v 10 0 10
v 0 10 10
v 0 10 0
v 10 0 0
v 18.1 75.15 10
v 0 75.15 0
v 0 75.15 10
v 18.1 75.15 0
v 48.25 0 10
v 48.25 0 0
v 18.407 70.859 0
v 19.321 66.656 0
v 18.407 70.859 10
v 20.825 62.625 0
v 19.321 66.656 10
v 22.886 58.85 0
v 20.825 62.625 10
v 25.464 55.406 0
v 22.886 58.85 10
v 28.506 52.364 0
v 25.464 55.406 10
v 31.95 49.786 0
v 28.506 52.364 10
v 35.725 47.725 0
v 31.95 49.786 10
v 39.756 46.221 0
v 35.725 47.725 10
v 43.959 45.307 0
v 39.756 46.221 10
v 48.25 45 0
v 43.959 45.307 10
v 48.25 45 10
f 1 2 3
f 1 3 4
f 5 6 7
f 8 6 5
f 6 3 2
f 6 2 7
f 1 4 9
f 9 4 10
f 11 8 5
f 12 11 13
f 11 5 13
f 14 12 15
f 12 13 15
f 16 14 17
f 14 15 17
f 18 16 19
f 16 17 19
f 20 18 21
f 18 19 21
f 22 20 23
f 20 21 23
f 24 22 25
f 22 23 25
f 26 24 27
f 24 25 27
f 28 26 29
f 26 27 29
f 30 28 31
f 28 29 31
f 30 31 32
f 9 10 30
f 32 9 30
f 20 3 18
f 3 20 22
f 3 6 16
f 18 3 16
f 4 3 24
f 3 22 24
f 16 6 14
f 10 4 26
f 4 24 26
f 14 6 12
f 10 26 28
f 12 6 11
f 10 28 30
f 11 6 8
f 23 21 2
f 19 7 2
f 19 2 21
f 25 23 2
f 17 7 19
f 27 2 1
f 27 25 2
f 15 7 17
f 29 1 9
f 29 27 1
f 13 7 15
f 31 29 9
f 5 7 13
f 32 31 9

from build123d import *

# Parameters (mm, degrees)
SKETCH_W     = 48.25
SKETCH_H     = 75.15
PAD_DEPTH    = 10
SKETCH001_R  = 30.15
POCKET_DEPTH = 10.001


with BuildPart() as part:
    # Sketch → Pad (new body)
    with BuildSketch(Plane.XY):
        with Locations((24.125, 37.575)):
            Rectangle(SKETCH_W, SKETCH_H)
    extrude(amount=PAD_DEPTH)

    # Sketch001 (on Face6 of Pad) → Pocket (cut, through all)
    with BuildSketch(Plane.XY.offset(10)):
        with Locations((48.25, 75.15)):
            Circle(SKETCH001_R)
        Polygon((0, 10), (10, 0), (0, 0), align=None)
    extrude(amount=-POCKET_DEPTH, mode=Mode.SUBTRACT)


solid = part.part
